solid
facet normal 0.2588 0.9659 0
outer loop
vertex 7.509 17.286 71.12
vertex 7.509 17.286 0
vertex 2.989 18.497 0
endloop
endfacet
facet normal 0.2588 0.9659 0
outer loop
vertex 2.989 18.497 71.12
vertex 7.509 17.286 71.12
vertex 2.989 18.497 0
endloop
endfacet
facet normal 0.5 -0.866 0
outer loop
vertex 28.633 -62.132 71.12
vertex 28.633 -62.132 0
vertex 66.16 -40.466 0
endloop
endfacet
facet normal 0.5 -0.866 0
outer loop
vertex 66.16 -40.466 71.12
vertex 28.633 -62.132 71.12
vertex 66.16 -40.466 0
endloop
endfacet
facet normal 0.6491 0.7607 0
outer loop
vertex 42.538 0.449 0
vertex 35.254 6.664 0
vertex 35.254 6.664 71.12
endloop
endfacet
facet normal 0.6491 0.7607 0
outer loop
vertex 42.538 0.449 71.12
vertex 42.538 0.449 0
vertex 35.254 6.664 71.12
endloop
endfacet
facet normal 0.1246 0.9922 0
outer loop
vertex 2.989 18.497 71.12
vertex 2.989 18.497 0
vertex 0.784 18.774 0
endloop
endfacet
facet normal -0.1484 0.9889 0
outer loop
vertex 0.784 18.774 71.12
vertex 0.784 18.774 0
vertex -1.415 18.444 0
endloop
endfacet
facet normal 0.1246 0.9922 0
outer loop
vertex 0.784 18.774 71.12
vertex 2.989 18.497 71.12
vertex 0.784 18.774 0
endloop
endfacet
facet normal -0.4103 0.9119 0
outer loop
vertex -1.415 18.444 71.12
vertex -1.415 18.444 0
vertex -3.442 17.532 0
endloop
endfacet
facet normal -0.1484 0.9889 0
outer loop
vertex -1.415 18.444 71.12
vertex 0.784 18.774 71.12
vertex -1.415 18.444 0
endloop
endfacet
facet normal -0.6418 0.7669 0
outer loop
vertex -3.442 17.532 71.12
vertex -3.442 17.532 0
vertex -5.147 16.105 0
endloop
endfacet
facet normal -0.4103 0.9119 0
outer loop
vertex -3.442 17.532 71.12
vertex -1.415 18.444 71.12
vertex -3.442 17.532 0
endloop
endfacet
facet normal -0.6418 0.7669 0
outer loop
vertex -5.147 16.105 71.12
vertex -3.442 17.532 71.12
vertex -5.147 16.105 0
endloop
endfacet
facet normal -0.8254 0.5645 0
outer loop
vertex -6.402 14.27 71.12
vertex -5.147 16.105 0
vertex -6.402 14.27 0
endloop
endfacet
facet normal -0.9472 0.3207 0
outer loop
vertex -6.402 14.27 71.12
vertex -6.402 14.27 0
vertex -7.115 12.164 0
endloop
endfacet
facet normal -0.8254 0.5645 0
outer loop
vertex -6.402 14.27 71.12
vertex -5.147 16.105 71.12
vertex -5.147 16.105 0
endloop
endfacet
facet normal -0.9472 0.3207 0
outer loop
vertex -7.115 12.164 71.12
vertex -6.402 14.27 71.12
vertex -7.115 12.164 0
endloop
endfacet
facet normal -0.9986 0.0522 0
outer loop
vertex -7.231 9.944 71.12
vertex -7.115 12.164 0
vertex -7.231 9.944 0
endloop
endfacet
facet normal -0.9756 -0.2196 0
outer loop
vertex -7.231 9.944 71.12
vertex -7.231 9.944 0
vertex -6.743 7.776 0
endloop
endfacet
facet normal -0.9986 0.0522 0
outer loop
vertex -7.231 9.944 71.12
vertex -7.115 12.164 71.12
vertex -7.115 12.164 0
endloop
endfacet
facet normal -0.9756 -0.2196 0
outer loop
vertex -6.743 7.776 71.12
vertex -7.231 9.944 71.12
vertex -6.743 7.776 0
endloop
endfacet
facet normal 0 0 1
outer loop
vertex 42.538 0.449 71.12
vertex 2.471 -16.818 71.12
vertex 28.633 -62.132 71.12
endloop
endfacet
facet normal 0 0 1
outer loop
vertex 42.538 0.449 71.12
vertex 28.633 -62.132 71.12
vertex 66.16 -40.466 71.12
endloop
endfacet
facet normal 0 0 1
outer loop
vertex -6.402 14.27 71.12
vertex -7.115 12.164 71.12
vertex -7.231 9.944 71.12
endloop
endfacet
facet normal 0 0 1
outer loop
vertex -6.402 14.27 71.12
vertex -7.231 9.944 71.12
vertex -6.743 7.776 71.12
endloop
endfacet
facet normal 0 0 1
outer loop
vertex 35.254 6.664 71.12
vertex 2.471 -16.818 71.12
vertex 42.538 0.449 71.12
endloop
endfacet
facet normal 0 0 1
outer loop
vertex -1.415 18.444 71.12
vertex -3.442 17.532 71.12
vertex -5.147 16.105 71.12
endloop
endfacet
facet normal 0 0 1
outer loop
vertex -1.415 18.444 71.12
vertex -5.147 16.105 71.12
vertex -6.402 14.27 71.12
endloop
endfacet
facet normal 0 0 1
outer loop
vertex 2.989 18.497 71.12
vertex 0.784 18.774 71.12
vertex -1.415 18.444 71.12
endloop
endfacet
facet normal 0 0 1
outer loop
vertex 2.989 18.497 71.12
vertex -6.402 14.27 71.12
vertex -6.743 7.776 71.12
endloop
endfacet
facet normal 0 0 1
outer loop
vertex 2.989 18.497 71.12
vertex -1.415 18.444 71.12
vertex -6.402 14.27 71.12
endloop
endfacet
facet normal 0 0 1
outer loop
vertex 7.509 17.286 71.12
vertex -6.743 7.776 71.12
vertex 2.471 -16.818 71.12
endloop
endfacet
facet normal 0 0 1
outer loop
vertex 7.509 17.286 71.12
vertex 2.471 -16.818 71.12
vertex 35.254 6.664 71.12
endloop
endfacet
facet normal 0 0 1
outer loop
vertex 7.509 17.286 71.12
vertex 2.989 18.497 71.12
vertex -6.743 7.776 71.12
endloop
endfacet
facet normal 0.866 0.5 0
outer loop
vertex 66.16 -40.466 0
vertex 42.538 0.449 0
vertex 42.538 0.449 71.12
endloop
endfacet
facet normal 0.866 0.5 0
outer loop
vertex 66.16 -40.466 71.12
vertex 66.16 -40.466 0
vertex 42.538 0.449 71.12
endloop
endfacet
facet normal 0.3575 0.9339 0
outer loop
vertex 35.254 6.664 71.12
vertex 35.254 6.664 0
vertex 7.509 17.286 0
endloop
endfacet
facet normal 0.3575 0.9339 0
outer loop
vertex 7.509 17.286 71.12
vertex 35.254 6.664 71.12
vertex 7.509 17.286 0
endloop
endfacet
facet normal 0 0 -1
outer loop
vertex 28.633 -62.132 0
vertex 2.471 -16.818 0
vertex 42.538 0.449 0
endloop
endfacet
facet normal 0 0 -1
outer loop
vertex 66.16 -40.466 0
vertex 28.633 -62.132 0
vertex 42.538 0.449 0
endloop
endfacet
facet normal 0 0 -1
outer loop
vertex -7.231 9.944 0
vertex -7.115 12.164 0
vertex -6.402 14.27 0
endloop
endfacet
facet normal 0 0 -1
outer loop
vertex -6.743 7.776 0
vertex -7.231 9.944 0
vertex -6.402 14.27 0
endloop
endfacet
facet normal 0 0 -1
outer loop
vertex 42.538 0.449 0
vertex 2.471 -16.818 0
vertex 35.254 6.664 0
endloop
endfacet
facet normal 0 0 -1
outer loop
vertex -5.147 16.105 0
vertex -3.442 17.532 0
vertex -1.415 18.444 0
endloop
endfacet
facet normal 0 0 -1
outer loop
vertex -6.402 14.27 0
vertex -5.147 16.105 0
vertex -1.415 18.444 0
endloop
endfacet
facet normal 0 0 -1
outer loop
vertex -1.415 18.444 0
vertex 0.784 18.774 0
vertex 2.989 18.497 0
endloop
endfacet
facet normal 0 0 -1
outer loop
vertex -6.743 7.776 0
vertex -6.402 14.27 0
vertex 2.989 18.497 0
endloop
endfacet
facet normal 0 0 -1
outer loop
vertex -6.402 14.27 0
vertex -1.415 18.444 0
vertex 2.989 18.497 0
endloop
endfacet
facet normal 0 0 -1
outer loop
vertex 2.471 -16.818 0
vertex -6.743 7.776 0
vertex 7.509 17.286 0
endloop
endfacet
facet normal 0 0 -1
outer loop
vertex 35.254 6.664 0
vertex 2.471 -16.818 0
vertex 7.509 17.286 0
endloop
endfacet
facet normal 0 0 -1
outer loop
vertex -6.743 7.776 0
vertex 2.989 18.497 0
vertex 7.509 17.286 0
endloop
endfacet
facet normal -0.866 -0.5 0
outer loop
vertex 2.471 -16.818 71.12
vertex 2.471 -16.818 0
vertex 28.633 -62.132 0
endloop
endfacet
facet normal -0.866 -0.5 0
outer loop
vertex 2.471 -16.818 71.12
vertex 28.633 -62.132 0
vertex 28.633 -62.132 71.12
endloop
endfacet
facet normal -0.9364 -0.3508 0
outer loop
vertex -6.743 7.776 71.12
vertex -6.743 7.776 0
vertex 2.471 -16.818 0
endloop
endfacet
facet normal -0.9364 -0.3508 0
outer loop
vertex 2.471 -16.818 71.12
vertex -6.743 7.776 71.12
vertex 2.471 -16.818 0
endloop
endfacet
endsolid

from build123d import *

# Parameters (mm, degrees)
F1_DEPTH = 71.12
F2_DEPTH = 52.324
F3_SIZE  = 5.08
F4_R     = 8.142383265


with BuildPart() as f1:
    # F0 (on Top) → F1 (new body)
    with BuildSketch(Plane.XY):
        Polygon((7.5089540333, 17.2860901803), (-12.2935976833, 22.5921664387), (2.4708837736, -16.8182179332), (39.9978423606, 4.8479831407), align=None)
    extrude(amount=F1_DEPTH)

    # F2 (add): a face of the model
    f2_faces = [f1.faces().sort_by_distance(p)[0] for p in [
        (21.2343630671, -5.9851173963, 35.56),
    ]]
    extrude(f2_faces, amount=F2_DEPTH)

    # F3
    f3_edges = [f1.edges().sort_by_distance(p)[0] for p in [
        (39.997842, 4.847983, 35.56),
    ]]
    chamfer(f3_edges, length=F3_SIZE)

    # F4
    f4_edges = [f1.edges().sort_by_distance(p)[0] for p in [
        (-12.293598, 22.592166, 35.56),
    ]]
    fillet(f4_edges, radius=F4_R)


solid = f1.part
